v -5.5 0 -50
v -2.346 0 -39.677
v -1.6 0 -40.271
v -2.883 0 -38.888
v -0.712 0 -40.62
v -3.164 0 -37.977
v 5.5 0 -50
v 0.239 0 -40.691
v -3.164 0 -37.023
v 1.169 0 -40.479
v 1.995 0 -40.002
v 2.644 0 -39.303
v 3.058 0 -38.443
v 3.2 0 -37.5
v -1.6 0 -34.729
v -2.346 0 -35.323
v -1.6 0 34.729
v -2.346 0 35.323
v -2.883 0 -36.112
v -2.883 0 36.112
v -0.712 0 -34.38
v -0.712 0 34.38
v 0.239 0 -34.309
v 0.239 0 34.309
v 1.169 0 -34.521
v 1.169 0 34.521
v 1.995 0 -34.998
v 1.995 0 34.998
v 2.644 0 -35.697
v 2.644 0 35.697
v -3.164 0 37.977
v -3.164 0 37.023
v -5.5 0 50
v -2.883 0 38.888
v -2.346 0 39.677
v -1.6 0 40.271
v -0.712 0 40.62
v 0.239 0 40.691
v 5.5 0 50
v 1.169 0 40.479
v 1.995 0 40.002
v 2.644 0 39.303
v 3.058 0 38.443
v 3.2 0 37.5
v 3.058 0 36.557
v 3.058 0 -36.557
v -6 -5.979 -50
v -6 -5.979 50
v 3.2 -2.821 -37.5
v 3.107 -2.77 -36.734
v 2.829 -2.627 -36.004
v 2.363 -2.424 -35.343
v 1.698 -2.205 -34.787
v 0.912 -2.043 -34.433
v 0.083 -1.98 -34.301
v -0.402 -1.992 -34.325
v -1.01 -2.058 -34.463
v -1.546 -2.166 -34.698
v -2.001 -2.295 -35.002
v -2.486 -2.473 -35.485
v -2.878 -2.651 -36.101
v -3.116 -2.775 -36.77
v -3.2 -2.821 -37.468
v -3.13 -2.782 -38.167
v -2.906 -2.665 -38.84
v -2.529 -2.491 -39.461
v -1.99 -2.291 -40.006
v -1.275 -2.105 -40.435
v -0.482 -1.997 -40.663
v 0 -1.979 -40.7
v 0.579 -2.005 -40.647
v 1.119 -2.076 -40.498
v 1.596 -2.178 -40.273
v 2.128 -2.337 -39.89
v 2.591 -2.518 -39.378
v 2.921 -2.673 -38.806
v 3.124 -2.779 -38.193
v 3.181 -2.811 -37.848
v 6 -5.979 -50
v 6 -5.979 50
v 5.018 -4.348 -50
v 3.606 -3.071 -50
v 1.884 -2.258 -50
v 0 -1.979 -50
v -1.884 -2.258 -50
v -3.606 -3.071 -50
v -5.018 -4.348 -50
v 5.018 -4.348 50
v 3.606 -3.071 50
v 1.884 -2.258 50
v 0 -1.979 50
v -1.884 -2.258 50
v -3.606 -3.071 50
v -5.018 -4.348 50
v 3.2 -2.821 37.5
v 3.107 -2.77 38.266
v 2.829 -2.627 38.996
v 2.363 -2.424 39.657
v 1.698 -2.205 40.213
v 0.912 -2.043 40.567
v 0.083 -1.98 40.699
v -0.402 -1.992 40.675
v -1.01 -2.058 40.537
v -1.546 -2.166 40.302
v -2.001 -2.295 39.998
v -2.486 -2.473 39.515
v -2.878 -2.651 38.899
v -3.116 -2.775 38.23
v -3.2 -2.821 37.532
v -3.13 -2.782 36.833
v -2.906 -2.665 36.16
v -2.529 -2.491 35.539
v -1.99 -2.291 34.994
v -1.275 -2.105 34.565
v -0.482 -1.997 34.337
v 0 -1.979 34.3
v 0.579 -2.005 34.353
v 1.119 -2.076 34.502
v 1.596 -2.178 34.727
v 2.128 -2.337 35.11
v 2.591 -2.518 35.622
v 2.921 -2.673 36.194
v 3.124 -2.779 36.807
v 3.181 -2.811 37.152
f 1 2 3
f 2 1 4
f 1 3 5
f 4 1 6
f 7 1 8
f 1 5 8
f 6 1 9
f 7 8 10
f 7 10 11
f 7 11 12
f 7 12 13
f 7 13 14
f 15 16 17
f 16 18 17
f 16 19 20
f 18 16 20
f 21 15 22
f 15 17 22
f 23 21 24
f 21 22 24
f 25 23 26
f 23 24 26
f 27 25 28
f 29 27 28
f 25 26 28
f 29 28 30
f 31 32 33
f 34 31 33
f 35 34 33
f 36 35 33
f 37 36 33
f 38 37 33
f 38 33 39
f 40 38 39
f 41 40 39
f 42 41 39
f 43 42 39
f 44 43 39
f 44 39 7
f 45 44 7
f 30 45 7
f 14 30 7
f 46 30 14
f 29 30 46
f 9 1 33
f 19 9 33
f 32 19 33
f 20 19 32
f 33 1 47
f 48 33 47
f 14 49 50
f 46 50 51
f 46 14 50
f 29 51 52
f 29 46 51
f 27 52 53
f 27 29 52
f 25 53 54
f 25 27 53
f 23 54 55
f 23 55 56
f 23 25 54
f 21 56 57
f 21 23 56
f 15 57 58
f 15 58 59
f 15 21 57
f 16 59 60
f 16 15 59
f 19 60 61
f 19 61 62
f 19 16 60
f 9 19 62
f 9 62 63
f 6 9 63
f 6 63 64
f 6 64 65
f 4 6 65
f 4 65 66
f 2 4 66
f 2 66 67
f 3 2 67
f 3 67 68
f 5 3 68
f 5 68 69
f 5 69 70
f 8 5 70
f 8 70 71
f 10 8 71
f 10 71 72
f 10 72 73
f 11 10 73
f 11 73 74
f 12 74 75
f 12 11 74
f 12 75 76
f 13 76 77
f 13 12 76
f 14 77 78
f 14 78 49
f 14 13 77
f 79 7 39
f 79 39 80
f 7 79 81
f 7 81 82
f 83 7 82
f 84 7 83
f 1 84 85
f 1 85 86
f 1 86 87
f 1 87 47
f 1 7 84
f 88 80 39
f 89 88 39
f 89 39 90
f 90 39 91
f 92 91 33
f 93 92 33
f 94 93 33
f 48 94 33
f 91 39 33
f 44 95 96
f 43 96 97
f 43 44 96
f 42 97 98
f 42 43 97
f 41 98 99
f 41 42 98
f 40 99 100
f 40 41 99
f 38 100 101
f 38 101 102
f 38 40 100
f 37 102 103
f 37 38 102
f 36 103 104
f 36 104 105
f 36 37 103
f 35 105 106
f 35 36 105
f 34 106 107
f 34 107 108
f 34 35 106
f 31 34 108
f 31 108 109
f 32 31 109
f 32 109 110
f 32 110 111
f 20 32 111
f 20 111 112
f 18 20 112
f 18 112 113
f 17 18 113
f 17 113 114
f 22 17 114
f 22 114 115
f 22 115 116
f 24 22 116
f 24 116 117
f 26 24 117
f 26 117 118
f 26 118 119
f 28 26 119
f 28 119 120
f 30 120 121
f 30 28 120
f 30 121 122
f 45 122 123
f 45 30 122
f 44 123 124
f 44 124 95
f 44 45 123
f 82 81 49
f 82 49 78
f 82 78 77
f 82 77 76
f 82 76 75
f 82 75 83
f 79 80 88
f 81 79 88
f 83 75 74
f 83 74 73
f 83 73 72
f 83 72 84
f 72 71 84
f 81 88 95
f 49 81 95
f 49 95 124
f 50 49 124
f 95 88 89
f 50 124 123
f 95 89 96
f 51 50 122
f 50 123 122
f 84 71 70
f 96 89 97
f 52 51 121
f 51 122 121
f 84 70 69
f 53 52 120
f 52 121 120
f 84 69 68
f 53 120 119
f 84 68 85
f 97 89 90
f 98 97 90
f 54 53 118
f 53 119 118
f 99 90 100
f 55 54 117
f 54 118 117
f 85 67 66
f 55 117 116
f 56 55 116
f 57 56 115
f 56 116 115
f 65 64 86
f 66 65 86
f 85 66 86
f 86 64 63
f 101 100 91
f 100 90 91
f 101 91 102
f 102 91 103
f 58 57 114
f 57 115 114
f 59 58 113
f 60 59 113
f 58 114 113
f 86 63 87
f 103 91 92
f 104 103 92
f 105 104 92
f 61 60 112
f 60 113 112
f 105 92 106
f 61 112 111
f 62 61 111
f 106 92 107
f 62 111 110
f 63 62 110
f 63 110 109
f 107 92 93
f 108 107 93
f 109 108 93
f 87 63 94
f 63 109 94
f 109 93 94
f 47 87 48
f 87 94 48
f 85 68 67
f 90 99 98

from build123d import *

# Parameters (mm, degrees)
CYLINDER001_R          = 3.2
CYLINDER001_DEPTH      = 10
CYLINDER001_ROLL_ANGLE = 90
CYLINDER_R             = 3.2
CYLINDER_DEPTH         = 10
CYLINDER_ROLL_ANGLE    = 90
PAD_DEPTH              = 50


with BuildPart() as cylinder001:
    # Cylinder001 → Cylinder001 (new body)
    with BuildSketch(Plane.XY):
        Circle(CYLINDER001_R)
    extrude(amount=CYLINDER001_DEPTH)


with BuildPart() as cylinder001_1:
    # Cylinder001 roll: moved
    add(cylinder001.part.rotate(Axis((0, 0, 0), (1, 0, 0)), CYLINDER001_ROLL_ANGLE))


with BuildPart() as cylinder001_2:
    # Cylinder001 placement: moved
    add(cylinder001_1.part.moved(Location((0, 2, -37.5))))


with BuildPart() as cylinder:
    # Cylinder → Cylinder (new body)
    with BuildSketch(Plane.XY):
        Circle(CYLINDER_R)
    extrude(amount=CYLINDER_DEPTH)


with BuildPart() as cylinder_1:
    # Cylinder roll: moved
    add(cylinder.part.rotate(Axis((0, 0, 0), (1, 0, 0)), CYLINDER_ROLL_ANGLE))


with BuildPart() as cylinder_2:
    # Cylinder placement: moved
    add(cylinder_1.part.moved(Location((0, 2, 37.5))))


with BuildPart() as cut001:
    # Sketch001 → Pad (new body, symmetric)
    with BuildSketch(Plane.XY):
        with BuildLine():
            ThreePointArc((6, -5.97913), (0, -1.97913), (-6, -5.97913))
            Line((-5.5, 0), (-6, -5.97913))
            Line((-5.5, 0), (5.5, 0))
            Line((5.5, 0), (6, -5.97913))
        make_face()
    extrude(amount=PAD_DEPTH, both=True)

    # Cut: cut Cylinder
    add(cylinder_2.part, mode=Mode.SUBTRACT)

    # Cut001: cut Cylinder001
    add(cylinder001_2.part, mode=Mode.SUBTRACT)


solid = cut001.part
